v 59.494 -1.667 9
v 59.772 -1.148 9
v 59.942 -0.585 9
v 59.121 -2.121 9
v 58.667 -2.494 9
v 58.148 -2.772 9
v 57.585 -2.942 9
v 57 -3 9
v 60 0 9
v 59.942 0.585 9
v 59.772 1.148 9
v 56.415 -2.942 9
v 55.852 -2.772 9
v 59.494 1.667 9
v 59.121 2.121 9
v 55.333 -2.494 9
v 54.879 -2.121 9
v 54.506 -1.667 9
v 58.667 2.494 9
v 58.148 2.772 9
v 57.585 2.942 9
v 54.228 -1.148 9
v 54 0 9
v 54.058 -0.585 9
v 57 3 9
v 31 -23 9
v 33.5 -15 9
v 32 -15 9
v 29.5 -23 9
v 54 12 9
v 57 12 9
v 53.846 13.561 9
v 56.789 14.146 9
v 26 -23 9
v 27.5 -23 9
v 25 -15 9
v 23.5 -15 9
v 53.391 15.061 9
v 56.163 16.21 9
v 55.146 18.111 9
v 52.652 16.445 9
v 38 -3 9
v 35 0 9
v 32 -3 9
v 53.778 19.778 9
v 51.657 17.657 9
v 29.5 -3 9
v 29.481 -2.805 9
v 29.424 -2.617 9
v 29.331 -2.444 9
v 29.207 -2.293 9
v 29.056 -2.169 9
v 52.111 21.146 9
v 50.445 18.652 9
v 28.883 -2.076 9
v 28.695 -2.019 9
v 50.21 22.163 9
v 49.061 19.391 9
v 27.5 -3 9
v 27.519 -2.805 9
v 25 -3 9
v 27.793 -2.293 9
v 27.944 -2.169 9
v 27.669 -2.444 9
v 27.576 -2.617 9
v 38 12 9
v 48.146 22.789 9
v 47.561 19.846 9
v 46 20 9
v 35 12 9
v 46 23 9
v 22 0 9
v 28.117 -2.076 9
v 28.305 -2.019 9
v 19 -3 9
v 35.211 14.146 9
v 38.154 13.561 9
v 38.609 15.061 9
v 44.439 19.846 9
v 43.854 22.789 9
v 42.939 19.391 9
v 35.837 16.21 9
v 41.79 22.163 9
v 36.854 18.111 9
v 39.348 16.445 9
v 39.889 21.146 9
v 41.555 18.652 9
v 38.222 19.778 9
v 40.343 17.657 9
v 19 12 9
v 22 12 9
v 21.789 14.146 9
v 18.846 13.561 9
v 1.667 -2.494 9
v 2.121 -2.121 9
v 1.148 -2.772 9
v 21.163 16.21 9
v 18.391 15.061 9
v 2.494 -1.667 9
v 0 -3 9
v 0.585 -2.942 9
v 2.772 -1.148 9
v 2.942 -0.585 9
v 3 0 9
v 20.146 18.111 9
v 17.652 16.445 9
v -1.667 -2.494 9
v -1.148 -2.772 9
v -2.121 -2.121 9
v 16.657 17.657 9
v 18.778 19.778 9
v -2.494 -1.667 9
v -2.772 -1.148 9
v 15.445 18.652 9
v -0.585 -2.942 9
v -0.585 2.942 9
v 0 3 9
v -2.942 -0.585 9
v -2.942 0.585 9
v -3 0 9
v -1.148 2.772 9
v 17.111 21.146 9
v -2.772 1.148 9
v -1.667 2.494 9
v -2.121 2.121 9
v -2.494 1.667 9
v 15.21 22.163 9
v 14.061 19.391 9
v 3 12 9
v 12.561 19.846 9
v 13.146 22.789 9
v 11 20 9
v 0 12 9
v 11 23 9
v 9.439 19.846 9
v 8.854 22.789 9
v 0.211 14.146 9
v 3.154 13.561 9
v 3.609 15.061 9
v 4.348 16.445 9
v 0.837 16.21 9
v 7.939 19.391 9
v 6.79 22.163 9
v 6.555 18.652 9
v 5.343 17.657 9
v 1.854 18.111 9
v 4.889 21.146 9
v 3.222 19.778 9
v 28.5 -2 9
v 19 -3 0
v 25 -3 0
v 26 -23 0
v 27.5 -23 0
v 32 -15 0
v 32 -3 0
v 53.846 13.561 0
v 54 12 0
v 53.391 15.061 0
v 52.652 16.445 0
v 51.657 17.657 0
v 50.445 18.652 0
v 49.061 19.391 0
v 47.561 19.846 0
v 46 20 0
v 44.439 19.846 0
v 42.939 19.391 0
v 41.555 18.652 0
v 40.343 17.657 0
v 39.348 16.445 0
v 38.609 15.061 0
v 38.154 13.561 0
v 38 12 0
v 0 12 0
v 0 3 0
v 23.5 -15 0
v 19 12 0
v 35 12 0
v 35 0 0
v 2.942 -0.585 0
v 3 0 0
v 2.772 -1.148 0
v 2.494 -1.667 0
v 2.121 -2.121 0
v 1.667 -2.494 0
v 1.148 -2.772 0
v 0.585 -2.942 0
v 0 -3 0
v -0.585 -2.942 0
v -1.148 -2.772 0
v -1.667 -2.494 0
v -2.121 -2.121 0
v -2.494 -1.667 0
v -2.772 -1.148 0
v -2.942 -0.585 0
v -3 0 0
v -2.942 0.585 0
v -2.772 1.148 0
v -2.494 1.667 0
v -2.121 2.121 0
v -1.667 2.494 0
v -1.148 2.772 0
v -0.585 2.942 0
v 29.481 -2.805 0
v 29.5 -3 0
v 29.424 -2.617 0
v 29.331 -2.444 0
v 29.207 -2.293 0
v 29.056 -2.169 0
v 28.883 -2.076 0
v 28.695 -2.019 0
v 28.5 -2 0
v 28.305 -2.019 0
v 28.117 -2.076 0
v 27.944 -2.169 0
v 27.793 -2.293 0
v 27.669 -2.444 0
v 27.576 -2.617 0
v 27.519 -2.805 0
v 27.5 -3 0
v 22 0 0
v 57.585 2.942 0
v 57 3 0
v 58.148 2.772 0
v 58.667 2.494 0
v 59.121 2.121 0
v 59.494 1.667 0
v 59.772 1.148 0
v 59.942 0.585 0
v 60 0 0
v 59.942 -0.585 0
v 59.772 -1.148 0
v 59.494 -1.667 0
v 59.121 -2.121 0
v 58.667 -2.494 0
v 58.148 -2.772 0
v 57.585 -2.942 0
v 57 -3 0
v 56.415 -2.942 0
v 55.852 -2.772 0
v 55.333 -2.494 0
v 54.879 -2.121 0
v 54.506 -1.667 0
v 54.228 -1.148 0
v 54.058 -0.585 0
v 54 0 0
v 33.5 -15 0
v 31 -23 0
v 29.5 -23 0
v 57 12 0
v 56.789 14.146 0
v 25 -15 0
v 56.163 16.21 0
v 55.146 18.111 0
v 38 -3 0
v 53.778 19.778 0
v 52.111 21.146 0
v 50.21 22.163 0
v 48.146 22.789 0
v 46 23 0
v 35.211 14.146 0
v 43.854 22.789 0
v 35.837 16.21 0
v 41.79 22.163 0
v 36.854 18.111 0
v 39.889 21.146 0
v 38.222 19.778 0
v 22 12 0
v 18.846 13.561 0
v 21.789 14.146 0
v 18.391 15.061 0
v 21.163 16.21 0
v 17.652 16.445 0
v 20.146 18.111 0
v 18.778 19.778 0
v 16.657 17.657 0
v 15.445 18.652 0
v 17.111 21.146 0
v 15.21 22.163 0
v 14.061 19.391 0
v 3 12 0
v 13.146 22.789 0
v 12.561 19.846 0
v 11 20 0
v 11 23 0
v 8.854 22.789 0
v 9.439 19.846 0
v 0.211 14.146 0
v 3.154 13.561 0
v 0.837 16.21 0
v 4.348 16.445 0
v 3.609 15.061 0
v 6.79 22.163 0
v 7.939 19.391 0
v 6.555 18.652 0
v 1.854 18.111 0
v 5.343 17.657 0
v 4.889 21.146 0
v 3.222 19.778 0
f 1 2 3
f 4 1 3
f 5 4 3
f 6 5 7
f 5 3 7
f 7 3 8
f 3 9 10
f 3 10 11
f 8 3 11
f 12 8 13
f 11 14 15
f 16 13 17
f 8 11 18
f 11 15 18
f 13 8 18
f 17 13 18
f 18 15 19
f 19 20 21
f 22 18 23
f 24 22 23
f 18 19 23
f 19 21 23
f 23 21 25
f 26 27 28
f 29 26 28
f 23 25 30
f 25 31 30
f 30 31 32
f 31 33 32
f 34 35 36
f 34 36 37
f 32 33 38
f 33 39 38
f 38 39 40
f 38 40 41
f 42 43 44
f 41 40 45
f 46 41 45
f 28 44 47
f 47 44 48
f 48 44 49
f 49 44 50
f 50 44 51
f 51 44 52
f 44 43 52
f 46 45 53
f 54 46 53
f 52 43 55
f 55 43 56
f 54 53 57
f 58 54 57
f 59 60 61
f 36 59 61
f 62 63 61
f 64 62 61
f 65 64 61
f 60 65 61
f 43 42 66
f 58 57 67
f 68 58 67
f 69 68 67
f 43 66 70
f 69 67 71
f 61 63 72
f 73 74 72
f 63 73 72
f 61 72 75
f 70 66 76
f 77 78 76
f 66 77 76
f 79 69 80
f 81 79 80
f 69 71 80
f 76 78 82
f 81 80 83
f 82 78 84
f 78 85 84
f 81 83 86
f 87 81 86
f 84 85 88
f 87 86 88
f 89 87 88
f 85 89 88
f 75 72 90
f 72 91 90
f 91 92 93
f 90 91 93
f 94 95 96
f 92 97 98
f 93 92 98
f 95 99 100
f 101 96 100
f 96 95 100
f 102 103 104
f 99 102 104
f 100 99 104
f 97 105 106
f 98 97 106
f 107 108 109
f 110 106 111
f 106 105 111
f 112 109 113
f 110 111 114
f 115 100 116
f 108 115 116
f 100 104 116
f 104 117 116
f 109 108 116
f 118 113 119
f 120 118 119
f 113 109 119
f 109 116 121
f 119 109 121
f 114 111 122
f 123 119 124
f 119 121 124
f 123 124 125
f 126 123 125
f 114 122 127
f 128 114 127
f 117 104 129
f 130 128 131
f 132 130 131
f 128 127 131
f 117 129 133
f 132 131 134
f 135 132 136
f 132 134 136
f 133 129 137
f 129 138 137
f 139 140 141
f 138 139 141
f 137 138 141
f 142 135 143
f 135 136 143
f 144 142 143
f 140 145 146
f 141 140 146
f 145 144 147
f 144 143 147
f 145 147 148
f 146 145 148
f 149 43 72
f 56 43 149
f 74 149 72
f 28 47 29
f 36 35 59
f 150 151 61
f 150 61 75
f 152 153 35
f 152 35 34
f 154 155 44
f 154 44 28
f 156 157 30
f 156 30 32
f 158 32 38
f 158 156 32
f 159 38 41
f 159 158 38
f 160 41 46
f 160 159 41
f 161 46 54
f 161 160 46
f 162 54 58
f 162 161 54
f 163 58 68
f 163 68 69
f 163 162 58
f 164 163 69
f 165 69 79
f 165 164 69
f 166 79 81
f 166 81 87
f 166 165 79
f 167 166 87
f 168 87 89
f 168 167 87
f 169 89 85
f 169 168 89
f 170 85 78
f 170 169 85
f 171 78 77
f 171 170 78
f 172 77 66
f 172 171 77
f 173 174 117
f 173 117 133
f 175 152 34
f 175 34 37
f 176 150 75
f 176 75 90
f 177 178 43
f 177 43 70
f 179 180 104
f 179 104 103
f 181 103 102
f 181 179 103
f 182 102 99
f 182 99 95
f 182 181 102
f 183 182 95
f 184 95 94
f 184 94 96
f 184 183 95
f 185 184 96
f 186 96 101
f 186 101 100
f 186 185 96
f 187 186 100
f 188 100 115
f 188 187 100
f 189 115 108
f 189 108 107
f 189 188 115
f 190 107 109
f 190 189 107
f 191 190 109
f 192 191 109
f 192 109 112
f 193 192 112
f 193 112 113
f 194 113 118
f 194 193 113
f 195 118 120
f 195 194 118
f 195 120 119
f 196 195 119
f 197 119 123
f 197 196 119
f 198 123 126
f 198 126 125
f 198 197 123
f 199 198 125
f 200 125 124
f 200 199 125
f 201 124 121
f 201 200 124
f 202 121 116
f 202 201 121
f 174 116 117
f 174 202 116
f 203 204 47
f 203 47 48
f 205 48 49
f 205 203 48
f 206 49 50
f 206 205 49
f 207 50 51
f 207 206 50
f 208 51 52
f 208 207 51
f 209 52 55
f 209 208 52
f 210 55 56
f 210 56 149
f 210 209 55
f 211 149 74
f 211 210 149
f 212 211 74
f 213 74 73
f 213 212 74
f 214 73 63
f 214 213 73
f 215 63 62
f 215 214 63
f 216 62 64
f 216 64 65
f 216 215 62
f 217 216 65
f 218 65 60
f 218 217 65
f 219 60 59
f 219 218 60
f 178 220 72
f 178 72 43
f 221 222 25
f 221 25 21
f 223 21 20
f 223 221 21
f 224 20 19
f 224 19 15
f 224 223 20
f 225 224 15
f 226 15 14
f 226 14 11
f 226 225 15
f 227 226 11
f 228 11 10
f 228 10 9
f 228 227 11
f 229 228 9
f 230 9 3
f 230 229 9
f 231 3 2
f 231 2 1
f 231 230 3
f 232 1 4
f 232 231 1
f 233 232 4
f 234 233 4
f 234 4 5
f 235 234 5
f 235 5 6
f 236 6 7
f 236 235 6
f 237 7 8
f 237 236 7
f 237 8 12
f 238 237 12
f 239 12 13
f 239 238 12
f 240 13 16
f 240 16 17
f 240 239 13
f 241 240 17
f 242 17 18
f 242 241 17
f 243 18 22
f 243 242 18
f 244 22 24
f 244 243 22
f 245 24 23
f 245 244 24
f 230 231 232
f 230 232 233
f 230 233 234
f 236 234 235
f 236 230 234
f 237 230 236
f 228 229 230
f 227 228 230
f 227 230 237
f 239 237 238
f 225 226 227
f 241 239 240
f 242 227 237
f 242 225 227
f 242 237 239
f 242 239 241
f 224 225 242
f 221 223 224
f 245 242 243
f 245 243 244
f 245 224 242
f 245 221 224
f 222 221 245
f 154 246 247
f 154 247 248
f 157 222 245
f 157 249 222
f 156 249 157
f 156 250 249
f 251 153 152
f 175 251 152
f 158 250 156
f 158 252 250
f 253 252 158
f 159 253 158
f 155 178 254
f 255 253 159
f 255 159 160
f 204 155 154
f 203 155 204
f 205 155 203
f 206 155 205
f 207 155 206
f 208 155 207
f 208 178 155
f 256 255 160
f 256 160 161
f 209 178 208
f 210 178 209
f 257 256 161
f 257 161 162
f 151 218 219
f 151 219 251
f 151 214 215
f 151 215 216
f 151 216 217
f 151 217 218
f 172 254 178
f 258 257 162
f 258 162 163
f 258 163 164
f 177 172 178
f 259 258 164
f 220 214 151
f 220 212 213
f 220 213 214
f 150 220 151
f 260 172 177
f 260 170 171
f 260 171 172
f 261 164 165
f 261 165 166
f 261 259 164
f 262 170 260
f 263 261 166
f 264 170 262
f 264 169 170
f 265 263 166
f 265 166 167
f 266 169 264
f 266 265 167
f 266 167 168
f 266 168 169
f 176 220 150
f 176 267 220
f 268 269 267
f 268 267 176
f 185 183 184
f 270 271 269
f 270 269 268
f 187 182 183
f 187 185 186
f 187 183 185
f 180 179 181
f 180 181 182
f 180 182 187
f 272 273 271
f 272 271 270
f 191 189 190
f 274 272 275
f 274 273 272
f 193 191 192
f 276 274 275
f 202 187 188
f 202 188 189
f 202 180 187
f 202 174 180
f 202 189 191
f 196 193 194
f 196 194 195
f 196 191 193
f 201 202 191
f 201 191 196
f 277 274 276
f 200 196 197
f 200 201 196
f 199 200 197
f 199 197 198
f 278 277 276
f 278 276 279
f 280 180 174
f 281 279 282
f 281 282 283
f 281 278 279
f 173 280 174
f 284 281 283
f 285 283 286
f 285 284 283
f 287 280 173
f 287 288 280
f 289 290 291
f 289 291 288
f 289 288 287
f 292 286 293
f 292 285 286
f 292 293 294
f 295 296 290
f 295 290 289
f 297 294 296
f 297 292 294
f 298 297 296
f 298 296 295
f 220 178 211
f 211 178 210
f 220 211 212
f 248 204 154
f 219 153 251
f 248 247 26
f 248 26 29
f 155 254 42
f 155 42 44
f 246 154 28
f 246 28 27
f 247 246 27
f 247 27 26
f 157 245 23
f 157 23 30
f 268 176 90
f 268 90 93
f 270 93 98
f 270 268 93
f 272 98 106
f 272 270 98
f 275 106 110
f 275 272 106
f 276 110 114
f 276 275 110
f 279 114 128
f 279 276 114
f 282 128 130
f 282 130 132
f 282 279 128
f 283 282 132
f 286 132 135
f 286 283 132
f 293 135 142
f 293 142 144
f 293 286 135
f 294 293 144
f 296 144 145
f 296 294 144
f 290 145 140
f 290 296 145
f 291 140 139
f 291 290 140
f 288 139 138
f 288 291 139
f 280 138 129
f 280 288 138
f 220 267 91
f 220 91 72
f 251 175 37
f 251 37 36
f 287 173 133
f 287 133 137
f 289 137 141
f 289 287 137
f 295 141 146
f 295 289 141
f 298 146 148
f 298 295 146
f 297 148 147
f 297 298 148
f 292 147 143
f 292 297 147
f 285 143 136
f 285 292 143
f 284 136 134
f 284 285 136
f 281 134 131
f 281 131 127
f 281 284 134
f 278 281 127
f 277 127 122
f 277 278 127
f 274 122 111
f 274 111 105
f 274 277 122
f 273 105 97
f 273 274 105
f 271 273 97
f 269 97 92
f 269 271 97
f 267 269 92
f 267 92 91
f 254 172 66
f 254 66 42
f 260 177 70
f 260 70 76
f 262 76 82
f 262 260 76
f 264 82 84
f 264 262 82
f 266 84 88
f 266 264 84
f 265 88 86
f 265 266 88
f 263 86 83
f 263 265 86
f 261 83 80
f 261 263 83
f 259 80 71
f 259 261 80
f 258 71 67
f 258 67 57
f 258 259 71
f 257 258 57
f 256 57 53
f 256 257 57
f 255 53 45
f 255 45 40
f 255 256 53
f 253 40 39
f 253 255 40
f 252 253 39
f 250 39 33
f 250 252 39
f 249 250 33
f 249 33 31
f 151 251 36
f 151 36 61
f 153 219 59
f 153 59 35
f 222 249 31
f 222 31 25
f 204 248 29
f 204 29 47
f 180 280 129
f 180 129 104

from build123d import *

# Parameters (mm, degrees)
BOSS_EXTRUDE1_DEPTH = 9


with BuildPart() as part:
    # Sketch1 → Boss-Extrude1 (new body)
    with BuildSketch(Plane.XY):
        with BuildLine():
            Line((0, 3), (0, 12))
            ThreePointArc((0, 12), (11, 23), (22, 12))
            Line((22, 12), (22, 0))
            Line((22, 0), (35, 0))
            Line((35, 0), (35, 12))
            ThreePointArc((35, 12), (46, 23), (57, 12))
            Line((57, 12), (57, 3))
            ThreePointArc((57, 3), (59.121320344, -2.121320344), (54, 0))
            Line((54, 0), (54, 12))
            ThreePointArc((54, 12), (46, 20), (38, 12))
            Line((38, 12), (38, -3))
            Line((38, -3), (32, -3))
            Line((32, -3), (32, -15))
            Line((32, -15), (33.5, -15))
            Line((33.5, -15), (31, -23))
            Line((31, -23), (29.5, -23))
            Line((29.5, -23), (29.5, -3))
            ThreePointArc((29.5, -3), (28.5, -2), (27.5, -3))
            Line((27.5, -3), (27.5, -23))
            Line((27.5, -23), (26, -23))
            Line((26, -23), (23.5, -15))
            Line((23.5, -15), (25, -15))
            Line((25, -15), (25, -3))
            Line((25, -3), (19, -3))
            Line((19, -3), (19, 12))
            ThreePointArc((19, 12), (11, 20), (3, 12))
            Line((3, 12), (3, 0))
            ThreePointArc((3, 0), (-2.121320344, -2.121320344), (0, 3))
        make_face()
    extrude(amount=BOSS_EXTRUDE1_DEPTH)


solid = part.part
